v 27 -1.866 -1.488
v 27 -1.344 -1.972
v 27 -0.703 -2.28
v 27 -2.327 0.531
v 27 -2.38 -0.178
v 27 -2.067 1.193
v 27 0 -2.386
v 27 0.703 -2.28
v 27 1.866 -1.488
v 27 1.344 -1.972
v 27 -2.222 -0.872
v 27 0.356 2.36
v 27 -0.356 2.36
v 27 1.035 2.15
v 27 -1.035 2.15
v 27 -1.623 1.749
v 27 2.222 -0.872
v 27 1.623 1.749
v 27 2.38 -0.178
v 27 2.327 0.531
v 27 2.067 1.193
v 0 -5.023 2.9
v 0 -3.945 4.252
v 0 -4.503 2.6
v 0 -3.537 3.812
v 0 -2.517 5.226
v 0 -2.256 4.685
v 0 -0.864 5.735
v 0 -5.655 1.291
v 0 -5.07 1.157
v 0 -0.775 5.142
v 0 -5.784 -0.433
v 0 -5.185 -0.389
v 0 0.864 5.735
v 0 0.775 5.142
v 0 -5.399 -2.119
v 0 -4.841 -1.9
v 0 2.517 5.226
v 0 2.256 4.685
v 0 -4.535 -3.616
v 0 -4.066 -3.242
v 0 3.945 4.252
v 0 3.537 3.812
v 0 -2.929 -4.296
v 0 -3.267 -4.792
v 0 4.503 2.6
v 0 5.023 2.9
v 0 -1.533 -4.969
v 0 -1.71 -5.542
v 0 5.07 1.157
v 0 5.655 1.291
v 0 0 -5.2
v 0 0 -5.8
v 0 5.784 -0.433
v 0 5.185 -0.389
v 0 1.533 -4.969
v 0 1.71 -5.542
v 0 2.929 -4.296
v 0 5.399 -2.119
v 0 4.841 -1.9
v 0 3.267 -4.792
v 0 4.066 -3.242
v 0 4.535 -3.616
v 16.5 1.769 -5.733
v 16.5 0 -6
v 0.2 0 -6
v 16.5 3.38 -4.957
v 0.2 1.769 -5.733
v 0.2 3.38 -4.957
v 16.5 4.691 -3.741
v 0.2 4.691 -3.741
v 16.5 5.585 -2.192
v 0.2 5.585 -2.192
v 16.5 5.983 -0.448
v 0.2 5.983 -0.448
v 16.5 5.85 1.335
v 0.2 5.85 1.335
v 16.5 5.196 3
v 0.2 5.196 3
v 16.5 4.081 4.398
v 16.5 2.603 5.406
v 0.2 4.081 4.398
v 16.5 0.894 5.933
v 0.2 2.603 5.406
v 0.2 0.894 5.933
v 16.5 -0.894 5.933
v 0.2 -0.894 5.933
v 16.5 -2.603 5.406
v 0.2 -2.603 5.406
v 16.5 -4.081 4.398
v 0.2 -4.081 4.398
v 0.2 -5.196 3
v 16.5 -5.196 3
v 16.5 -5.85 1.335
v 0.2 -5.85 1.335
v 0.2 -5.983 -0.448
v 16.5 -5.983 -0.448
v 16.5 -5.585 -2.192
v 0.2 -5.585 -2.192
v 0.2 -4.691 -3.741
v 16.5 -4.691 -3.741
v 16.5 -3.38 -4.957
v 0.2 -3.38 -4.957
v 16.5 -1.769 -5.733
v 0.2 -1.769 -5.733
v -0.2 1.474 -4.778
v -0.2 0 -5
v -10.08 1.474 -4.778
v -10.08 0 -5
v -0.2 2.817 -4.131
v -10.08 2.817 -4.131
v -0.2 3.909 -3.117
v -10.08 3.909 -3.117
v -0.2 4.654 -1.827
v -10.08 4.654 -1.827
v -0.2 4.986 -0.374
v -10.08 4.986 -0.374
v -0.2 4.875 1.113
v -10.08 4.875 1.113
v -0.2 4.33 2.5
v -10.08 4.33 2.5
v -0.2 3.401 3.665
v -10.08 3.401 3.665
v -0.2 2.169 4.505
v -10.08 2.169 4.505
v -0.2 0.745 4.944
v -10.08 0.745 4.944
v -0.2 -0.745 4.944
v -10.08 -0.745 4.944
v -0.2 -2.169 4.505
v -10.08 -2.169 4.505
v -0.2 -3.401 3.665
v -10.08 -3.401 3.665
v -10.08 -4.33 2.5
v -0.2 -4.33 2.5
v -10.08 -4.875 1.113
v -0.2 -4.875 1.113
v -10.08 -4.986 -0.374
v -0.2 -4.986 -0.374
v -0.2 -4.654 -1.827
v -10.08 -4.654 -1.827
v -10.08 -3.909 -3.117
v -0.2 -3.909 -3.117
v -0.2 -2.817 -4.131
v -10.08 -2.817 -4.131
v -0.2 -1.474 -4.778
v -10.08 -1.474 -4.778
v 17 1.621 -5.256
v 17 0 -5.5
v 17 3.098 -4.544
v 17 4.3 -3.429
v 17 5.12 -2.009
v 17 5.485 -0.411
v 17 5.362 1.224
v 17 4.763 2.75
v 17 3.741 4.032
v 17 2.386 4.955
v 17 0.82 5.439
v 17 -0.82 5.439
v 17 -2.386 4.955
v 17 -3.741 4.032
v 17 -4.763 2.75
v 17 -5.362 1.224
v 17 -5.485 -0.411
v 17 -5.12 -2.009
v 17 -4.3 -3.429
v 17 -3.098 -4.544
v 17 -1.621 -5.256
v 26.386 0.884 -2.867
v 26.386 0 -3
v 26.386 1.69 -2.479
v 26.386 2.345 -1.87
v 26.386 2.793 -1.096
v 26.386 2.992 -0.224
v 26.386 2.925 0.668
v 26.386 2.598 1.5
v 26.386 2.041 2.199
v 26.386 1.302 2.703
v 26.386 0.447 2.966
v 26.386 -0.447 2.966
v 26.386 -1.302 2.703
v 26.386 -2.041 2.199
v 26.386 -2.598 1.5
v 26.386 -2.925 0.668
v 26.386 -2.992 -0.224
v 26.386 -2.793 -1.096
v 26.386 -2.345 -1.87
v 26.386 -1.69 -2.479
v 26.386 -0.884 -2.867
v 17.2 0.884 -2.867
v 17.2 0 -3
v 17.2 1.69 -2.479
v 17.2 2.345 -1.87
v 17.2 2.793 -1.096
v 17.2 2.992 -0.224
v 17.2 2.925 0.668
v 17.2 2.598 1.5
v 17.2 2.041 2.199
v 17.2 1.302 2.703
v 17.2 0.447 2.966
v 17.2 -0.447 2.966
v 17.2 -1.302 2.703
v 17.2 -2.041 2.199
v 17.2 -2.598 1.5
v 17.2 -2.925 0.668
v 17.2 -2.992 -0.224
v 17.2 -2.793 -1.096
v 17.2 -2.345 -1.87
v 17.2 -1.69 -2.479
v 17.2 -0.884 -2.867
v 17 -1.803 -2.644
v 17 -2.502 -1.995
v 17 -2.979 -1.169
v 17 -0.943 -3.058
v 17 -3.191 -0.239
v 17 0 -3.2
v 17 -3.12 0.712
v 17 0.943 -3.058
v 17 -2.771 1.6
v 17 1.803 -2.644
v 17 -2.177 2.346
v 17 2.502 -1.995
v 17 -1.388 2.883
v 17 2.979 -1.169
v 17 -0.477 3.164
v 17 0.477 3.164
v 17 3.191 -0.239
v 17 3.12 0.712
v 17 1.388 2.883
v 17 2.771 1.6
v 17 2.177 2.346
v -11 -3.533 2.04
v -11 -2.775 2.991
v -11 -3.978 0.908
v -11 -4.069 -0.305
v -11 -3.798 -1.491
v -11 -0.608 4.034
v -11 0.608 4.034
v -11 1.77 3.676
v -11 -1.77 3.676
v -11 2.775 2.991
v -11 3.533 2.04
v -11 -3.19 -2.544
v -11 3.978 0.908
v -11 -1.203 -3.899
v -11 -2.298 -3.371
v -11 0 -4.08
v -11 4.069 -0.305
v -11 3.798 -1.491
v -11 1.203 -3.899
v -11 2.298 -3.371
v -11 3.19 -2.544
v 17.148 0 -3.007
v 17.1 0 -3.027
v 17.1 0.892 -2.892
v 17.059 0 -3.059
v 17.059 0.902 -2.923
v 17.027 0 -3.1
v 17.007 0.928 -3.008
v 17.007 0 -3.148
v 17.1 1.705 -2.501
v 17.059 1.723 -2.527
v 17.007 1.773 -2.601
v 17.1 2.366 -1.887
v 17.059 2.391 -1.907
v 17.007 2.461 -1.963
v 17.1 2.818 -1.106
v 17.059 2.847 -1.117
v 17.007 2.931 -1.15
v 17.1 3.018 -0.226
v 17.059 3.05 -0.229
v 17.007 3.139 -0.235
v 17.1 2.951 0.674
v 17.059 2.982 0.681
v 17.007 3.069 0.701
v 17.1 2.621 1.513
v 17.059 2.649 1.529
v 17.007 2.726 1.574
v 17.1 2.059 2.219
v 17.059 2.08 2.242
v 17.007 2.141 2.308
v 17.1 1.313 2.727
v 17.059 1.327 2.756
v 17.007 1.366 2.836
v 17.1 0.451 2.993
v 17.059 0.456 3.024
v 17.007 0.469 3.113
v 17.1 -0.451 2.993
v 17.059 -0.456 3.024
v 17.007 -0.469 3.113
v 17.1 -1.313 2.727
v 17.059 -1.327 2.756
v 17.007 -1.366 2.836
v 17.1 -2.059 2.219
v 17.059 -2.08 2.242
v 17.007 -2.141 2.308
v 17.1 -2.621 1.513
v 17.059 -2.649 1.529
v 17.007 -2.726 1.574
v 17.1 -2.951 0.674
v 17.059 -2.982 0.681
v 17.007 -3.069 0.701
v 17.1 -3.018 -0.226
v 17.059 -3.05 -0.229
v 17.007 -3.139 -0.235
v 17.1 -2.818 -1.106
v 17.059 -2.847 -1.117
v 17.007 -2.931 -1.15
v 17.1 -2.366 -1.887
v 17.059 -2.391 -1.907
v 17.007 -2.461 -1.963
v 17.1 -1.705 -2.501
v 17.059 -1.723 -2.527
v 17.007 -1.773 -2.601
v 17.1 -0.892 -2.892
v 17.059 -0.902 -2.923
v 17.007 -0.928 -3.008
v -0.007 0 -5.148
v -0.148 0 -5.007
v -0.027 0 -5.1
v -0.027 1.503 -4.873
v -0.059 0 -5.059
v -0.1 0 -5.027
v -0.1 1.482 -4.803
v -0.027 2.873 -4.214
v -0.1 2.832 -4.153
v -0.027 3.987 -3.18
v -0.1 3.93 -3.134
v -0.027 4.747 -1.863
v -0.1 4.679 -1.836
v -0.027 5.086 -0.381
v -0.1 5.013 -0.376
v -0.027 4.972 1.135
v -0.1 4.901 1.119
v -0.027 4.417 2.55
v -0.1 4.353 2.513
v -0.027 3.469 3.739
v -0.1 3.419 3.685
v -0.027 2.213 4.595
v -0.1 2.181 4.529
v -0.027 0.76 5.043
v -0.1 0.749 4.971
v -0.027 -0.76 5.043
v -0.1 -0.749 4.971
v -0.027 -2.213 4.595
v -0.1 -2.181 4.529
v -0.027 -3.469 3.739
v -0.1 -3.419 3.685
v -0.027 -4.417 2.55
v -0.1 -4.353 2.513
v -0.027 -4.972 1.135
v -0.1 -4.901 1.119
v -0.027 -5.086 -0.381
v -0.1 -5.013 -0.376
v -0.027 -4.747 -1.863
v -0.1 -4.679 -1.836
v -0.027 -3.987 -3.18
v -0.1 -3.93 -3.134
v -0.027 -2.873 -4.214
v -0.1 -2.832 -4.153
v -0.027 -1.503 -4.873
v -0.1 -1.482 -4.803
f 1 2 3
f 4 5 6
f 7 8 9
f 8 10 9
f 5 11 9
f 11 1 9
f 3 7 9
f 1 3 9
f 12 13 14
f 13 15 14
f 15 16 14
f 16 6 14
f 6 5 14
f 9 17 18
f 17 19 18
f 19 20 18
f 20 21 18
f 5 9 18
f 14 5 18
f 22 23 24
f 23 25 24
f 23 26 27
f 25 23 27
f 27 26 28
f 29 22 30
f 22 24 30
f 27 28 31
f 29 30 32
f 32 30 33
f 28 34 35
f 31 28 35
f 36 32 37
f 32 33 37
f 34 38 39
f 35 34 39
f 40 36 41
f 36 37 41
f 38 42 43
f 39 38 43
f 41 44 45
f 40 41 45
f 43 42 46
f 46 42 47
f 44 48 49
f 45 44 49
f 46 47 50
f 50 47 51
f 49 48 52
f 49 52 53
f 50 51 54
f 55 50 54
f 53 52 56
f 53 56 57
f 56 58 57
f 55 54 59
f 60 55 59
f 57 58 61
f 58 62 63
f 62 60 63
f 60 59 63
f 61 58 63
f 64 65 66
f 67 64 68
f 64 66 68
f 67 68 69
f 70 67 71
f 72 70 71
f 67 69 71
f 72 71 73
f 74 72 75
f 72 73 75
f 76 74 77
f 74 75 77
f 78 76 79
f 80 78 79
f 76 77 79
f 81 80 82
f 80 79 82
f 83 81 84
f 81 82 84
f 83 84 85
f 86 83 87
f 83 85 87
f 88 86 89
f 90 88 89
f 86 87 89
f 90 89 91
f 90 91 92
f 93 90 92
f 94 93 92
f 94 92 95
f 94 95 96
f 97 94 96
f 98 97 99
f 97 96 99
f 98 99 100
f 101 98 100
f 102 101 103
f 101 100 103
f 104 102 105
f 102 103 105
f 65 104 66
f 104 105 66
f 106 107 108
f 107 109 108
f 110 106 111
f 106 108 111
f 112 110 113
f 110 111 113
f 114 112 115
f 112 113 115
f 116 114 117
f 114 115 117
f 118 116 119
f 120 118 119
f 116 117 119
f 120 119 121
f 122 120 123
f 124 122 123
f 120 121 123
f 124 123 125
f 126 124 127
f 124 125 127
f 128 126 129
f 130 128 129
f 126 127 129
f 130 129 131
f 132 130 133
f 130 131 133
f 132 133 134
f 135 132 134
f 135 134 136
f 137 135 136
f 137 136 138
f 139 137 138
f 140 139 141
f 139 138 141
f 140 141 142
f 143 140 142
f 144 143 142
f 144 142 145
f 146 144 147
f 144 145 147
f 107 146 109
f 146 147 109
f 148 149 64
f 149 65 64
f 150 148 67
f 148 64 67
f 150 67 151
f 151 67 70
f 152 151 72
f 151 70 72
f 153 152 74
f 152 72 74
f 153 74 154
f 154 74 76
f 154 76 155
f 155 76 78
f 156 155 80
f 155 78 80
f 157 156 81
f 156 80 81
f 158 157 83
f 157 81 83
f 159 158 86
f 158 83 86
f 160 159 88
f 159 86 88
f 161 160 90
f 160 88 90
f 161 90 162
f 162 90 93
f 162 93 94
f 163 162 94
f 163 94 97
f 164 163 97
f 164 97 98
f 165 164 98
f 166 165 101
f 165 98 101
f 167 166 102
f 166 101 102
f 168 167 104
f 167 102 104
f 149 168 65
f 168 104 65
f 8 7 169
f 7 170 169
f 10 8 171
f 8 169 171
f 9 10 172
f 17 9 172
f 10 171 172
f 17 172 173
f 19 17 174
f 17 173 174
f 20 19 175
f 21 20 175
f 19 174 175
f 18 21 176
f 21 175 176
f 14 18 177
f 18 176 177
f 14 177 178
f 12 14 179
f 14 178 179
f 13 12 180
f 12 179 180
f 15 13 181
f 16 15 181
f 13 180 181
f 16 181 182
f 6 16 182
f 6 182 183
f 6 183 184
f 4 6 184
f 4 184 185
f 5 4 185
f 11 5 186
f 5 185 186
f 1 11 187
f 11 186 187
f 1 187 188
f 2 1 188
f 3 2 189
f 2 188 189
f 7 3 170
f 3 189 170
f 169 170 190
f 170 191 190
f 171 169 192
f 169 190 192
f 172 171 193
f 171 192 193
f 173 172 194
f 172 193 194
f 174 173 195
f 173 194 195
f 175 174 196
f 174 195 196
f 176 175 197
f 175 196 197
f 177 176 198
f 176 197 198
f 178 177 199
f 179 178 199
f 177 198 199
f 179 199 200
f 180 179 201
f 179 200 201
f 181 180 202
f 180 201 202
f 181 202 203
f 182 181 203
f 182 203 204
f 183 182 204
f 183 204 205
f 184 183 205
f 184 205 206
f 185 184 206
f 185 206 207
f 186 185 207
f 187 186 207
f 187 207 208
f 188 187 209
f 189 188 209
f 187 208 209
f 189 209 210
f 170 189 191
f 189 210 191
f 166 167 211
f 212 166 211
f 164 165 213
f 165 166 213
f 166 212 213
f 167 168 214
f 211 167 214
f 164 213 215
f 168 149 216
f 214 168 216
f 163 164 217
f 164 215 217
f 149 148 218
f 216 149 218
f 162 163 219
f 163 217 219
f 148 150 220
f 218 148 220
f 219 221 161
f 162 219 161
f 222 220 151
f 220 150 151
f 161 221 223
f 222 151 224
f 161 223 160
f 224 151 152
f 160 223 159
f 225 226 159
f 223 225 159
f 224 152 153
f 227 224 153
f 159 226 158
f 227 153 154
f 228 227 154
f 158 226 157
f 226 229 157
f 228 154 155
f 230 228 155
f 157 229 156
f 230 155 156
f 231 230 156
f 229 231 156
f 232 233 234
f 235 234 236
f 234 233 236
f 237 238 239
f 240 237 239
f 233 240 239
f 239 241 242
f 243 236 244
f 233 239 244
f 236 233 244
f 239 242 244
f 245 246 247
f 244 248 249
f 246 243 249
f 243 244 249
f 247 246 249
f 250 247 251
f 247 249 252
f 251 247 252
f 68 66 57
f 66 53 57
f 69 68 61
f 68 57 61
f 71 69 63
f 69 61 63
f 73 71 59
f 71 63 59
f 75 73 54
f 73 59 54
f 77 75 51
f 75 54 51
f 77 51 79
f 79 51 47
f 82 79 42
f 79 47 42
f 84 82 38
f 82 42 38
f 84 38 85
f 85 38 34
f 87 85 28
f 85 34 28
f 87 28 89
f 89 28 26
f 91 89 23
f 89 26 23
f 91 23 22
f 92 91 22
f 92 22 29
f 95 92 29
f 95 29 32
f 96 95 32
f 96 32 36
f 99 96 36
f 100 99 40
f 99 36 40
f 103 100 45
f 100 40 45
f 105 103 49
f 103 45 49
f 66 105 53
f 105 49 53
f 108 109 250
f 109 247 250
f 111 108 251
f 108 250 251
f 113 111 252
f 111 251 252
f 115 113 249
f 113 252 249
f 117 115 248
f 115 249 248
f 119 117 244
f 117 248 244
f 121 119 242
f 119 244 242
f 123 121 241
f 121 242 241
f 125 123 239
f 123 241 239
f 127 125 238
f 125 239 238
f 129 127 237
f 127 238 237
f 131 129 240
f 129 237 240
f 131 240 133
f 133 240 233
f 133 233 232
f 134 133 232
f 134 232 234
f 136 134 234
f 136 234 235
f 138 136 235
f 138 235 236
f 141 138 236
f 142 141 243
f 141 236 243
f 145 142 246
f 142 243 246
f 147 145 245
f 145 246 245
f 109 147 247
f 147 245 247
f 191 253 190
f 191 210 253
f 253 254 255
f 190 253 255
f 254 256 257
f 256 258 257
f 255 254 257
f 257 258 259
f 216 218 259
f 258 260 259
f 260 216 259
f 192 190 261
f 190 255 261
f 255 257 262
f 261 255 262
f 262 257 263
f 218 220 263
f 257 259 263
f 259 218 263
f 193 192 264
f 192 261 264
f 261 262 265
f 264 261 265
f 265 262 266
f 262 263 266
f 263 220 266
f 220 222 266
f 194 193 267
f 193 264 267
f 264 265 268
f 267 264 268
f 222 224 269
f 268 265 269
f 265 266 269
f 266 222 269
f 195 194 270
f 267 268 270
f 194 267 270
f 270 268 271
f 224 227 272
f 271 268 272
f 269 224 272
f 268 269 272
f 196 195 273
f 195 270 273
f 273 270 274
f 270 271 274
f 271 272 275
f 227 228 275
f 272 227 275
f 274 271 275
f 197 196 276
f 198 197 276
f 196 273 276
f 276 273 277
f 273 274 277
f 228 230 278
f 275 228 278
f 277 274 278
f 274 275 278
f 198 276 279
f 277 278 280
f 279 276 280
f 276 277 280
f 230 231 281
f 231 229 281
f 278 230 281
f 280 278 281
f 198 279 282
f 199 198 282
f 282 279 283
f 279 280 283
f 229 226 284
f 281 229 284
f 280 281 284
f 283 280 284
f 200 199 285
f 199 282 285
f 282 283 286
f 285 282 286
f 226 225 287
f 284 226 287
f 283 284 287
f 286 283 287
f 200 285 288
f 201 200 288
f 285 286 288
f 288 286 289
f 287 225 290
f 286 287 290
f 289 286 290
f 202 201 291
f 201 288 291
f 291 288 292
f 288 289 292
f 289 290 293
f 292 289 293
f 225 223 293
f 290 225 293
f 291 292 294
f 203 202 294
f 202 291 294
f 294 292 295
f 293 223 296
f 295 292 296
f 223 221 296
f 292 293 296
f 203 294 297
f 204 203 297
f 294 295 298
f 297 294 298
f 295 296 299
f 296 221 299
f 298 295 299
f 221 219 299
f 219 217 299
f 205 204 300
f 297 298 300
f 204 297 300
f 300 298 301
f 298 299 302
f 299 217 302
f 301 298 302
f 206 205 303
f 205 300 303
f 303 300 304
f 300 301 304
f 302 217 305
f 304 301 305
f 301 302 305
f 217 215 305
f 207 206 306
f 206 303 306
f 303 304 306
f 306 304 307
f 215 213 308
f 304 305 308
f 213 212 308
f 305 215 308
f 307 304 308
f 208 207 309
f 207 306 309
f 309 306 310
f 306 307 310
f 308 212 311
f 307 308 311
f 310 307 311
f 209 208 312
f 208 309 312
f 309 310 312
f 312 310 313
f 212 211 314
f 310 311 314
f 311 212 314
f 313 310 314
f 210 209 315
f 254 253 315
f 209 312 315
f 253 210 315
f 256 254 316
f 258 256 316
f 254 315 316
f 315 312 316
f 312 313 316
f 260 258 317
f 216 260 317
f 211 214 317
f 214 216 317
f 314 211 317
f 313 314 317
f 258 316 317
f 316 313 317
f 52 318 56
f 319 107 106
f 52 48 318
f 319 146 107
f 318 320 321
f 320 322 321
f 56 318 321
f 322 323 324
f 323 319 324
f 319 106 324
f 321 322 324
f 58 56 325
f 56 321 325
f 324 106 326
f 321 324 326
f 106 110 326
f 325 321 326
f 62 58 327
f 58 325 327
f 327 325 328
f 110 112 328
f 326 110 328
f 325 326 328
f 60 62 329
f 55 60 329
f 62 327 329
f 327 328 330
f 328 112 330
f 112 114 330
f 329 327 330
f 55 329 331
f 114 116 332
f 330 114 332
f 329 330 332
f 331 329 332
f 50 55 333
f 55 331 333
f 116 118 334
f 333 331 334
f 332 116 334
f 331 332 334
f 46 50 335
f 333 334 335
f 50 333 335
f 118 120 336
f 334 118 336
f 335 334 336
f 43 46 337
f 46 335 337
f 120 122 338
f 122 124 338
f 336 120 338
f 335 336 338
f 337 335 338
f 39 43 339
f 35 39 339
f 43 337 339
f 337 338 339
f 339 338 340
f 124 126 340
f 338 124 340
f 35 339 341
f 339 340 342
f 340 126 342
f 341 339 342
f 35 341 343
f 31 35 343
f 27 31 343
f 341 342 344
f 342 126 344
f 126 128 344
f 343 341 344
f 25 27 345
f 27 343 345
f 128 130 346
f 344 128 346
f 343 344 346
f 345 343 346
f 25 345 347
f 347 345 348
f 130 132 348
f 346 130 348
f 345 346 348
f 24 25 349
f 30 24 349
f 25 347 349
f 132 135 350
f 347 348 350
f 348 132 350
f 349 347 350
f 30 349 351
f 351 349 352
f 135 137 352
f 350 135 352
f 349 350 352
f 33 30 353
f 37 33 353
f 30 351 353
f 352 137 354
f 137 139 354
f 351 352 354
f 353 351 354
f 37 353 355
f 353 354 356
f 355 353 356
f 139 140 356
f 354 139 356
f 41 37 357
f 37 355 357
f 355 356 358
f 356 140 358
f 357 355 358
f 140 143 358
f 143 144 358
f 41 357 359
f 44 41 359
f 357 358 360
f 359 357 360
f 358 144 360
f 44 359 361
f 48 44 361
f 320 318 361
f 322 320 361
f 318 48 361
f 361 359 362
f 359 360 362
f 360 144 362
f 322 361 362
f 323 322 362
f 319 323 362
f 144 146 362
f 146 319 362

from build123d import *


with BuildPart() as part:
    # Sketch1 → Revolve1 (revolve)
    with BuildSketch(Plane.XY, mode=Mode.PRIVATE) as revolve1_sk:
        with BuildLine():
            Line((-11, 4.08), (-11, 0))
            Line((-11, 0), (27, 0))
            Line((27, 0), (27, 2.3865))
            Line((27, 2.3865), (26.3865, 3))
            Line((26.3865, 3), (17.2, 3))
            ThreePointArc((17.2, 3), (17.058578644, 3.058578644), (17, 3.2))
            Line((17, 3.2), (17, 5.5))
            Line((17, 5.5), (16.5, 6))
            Line((16.5, 6), (0.2, 6))
            Line((0.2, 6), (0, 5.8))
            Line((0, 5.8), (0, 5.2))
            ThreePointArc((0, 5.2), (-0.058578644, 5.058578644), (-0.2, 5))
            Line((-0.2, 5), (-10.08, 5))
            Line((-10.08, 5), (-11, 4.08))
        make_face()
    revolve(revolve1_sk.sketch.rotate(Axis((-11, 0, 0), (1, 0, 0)), 270), axis=Axis((-11, 0, 0), (1, 0, 0)))


solid = part.part
